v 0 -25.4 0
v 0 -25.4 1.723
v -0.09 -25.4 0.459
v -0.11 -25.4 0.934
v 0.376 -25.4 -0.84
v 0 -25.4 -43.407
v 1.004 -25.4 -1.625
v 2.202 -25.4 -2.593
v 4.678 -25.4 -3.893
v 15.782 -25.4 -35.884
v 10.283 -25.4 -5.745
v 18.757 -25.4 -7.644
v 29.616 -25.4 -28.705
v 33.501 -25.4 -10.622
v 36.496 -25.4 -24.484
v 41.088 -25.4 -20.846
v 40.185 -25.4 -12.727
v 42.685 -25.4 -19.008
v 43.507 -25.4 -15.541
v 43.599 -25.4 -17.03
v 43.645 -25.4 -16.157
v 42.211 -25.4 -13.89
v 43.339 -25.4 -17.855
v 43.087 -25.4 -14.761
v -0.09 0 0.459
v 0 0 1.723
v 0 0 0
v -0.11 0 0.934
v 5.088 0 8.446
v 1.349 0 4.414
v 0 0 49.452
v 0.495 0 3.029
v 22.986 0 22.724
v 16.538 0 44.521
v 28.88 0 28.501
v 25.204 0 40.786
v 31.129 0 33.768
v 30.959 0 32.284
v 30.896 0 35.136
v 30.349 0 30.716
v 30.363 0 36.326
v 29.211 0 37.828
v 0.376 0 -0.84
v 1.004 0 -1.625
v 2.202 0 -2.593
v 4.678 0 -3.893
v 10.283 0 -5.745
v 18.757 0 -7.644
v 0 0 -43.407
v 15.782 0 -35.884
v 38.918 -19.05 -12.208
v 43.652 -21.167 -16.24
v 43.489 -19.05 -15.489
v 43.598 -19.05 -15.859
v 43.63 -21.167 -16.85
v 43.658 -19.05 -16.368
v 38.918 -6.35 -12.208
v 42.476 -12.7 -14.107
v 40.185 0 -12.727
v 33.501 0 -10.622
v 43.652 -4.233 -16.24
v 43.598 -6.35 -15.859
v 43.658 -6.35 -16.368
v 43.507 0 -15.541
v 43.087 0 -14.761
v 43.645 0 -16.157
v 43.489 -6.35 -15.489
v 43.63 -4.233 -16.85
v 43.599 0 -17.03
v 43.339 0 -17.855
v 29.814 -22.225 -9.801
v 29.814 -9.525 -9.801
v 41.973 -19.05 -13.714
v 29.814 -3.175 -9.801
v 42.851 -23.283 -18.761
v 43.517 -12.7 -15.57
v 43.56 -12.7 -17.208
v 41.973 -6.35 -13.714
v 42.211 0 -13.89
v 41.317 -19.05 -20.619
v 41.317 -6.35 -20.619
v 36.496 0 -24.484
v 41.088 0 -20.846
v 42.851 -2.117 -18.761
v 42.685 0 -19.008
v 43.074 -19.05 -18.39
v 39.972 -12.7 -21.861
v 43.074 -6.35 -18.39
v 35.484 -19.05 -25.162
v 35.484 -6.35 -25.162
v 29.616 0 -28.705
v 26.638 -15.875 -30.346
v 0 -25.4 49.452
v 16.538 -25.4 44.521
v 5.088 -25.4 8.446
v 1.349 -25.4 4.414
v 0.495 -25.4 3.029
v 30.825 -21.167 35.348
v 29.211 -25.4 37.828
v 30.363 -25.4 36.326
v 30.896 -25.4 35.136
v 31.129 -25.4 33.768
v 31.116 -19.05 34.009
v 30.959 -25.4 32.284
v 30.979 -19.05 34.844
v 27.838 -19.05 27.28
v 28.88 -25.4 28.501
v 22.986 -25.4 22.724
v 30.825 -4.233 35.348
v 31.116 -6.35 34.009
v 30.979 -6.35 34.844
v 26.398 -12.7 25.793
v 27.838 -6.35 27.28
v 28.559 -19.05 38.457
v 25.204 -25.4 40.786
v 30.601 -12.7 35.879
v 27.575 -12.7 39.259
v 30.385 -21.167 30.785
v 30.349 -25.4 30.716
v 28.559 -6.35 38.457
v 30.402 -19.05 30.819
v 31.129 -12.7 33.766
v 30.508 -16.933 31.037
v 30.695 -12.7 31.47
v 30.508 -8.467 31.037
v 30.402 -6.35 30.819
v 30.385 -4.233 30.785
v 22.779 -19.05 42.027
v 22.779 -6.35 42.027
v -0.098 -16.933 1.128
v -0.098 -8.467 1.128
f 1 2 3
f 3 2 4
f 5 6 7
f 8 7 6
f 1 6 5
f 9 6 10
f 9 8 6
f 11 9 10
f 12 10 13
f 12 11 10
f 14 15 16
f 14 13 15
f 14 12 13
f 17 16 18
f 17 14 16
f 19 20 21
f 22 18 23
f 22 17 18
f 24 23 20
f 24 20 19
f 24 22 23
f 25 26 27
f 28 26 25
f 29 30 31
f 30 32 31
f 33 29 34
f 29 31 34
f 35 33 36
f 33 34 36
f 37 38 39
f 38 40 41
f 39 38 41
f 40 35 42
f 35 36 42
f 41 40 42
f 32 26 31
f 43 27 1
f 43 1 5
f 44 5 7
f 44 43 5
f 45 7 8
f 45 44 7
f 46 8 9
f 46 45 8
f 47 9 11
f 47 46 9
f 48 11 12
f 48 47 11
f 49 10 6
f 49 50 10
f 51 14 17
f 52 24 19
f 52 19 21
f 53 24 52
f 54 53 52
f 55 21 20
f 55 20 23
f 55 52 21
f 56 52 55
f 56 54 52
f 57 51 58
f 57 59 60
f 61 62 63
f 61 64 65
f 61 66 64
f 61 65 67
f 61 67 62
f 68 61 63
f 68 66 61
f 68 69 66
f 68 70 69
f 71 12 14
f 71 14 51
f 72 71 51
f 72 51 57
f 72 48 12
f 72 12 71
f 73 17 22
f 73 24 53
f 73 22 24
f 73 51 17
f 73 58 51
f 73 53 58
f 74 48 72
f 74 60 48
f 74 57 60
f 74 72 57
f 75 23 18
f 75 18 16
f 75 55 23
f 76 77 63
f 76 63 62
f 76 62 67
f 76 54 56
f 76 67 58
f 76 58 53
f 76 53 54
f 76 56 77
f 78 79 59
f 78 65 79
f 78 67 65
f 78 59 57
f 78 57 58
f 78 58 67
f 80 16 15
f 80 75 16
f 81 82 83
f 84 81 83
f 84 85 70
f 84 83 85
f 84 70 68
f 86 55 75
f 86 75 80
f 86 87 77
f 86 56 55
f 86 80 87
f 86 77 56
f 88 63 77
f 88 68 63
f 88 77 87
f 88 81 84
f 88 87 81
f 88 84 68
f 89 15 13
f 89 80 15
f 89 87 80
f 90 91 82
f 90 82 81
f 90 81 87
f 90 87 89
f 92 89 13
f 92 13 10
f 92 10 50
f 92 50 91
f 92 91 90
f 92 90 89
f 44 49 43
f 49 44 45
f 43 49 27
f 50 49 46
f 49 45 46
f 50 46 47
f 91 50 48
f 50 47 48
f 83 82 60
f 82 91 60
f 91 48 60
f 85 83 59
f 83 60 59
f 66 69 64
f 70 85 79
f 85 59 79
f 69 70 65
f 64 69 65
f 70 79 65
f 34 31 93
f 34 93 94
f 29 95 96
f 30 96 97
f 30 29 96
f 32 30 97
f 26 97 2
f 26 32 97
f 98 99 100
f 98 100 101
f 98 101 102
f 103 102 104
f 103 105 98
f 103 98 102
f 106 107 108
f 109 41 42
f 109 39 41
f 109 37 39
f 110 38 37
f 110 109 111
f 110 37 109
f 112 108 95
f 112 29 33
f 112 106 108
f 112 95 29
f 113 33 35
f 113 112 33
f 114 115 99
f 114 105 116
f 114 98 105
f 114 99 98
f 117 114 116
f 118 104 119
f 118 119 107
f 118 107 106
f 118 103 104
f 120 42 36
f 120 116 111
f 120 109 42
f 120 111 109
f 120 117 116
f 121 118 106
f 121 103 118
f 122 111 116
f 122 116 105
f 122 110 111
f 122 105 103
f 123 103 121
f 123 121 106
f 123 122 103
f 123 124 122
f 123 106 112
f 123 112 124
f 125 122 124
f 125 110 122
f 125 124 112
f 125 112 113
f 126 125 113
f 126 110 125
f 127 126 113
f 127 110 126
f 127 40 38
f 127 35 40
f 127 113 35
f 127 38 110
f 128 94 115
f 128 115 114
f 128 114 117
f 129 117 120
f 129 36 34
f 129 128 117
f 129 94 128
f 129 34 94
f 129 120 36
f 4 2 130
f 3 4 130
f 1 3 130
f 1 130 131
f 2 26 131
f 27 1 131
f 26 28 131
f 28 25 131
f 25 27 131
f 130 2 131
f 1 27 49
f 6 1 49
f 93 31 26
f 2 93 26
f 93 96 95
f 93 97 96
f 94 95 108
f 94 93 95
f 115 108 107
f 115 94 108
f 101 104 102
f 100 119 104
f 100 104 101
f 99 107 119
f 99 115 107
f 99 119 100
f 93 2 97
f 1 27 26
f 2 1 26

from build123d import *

# Parameters (mm, degrees)
F1_DEPTH = 25.4


with BuildPart() as f1:
    # F0 (on Front) → F1 (new body)
    with BuildSketch(Plane.XZ):
        with BuildLine():
            Line((0, 49.4524389505), (0, 1.7233319871))
            add(Edge.make_bspline(
                [(0, 49.4524389505), (17.0466781491, 44.7516639334), (51.6919861441, 35.197908248), (1.8862090503, 9.6159898871), (0, 1.7233319871)],
                knots=[0, 0, 0, 0, 0.2253430572, 0.4579824617, 0.4579824617, 0.4579824617, 0.4579824617], degree=3))
        make_face()
    extrude(amount=F1_DEPTH)


with BuildPart() as f1b:
    # F0 (on Front) → F1, piece 2 (new body)
    with BuildSketch(Plane.XZ):
        with BuildLine():
            add(Edge.make_bspline(
                [(0, 1.7233319871), (-0.1448009714, 1.1174264375), (-0.1516181257, 0.5415893077), (0, 0)],
                knots=[0.4579824617, 0.4579824617, 0.4579824617, 0.4579824617, 0.4758417821, 0.4758417821, 0.4758417821, 0.4758417821], degree=3))
            Line((0, 0), (0, 1.7233319871))
        make_face()
    extrude(amount=F1_DEPTH)


with BuildPart() as f1c:
    # F0 (on Front) → F1, piece 3 (new body)
    with BuildSketch(Plane.XZ):
        with BuildLine():
            Line((0, 0), (0, -43.4065312147))
            add(Edge.make_bspline(
                [(0, 0), (2.1458317245, -7.6650434303), (72.4060198603, -9.3345570659), (24.7007412353, -31.7831466059), (0, -43.4065312147)],
                knots=[0.4758417821, 0.4758417821, 0.4758417821, 0.4758417821, 0.7286024339, 1, 1, 1, 1], degree=3))
        make_face()
    extrude(amount=F1_DEPTH)


solid = Compound([f1.part, f1b.part, f1c.part])
